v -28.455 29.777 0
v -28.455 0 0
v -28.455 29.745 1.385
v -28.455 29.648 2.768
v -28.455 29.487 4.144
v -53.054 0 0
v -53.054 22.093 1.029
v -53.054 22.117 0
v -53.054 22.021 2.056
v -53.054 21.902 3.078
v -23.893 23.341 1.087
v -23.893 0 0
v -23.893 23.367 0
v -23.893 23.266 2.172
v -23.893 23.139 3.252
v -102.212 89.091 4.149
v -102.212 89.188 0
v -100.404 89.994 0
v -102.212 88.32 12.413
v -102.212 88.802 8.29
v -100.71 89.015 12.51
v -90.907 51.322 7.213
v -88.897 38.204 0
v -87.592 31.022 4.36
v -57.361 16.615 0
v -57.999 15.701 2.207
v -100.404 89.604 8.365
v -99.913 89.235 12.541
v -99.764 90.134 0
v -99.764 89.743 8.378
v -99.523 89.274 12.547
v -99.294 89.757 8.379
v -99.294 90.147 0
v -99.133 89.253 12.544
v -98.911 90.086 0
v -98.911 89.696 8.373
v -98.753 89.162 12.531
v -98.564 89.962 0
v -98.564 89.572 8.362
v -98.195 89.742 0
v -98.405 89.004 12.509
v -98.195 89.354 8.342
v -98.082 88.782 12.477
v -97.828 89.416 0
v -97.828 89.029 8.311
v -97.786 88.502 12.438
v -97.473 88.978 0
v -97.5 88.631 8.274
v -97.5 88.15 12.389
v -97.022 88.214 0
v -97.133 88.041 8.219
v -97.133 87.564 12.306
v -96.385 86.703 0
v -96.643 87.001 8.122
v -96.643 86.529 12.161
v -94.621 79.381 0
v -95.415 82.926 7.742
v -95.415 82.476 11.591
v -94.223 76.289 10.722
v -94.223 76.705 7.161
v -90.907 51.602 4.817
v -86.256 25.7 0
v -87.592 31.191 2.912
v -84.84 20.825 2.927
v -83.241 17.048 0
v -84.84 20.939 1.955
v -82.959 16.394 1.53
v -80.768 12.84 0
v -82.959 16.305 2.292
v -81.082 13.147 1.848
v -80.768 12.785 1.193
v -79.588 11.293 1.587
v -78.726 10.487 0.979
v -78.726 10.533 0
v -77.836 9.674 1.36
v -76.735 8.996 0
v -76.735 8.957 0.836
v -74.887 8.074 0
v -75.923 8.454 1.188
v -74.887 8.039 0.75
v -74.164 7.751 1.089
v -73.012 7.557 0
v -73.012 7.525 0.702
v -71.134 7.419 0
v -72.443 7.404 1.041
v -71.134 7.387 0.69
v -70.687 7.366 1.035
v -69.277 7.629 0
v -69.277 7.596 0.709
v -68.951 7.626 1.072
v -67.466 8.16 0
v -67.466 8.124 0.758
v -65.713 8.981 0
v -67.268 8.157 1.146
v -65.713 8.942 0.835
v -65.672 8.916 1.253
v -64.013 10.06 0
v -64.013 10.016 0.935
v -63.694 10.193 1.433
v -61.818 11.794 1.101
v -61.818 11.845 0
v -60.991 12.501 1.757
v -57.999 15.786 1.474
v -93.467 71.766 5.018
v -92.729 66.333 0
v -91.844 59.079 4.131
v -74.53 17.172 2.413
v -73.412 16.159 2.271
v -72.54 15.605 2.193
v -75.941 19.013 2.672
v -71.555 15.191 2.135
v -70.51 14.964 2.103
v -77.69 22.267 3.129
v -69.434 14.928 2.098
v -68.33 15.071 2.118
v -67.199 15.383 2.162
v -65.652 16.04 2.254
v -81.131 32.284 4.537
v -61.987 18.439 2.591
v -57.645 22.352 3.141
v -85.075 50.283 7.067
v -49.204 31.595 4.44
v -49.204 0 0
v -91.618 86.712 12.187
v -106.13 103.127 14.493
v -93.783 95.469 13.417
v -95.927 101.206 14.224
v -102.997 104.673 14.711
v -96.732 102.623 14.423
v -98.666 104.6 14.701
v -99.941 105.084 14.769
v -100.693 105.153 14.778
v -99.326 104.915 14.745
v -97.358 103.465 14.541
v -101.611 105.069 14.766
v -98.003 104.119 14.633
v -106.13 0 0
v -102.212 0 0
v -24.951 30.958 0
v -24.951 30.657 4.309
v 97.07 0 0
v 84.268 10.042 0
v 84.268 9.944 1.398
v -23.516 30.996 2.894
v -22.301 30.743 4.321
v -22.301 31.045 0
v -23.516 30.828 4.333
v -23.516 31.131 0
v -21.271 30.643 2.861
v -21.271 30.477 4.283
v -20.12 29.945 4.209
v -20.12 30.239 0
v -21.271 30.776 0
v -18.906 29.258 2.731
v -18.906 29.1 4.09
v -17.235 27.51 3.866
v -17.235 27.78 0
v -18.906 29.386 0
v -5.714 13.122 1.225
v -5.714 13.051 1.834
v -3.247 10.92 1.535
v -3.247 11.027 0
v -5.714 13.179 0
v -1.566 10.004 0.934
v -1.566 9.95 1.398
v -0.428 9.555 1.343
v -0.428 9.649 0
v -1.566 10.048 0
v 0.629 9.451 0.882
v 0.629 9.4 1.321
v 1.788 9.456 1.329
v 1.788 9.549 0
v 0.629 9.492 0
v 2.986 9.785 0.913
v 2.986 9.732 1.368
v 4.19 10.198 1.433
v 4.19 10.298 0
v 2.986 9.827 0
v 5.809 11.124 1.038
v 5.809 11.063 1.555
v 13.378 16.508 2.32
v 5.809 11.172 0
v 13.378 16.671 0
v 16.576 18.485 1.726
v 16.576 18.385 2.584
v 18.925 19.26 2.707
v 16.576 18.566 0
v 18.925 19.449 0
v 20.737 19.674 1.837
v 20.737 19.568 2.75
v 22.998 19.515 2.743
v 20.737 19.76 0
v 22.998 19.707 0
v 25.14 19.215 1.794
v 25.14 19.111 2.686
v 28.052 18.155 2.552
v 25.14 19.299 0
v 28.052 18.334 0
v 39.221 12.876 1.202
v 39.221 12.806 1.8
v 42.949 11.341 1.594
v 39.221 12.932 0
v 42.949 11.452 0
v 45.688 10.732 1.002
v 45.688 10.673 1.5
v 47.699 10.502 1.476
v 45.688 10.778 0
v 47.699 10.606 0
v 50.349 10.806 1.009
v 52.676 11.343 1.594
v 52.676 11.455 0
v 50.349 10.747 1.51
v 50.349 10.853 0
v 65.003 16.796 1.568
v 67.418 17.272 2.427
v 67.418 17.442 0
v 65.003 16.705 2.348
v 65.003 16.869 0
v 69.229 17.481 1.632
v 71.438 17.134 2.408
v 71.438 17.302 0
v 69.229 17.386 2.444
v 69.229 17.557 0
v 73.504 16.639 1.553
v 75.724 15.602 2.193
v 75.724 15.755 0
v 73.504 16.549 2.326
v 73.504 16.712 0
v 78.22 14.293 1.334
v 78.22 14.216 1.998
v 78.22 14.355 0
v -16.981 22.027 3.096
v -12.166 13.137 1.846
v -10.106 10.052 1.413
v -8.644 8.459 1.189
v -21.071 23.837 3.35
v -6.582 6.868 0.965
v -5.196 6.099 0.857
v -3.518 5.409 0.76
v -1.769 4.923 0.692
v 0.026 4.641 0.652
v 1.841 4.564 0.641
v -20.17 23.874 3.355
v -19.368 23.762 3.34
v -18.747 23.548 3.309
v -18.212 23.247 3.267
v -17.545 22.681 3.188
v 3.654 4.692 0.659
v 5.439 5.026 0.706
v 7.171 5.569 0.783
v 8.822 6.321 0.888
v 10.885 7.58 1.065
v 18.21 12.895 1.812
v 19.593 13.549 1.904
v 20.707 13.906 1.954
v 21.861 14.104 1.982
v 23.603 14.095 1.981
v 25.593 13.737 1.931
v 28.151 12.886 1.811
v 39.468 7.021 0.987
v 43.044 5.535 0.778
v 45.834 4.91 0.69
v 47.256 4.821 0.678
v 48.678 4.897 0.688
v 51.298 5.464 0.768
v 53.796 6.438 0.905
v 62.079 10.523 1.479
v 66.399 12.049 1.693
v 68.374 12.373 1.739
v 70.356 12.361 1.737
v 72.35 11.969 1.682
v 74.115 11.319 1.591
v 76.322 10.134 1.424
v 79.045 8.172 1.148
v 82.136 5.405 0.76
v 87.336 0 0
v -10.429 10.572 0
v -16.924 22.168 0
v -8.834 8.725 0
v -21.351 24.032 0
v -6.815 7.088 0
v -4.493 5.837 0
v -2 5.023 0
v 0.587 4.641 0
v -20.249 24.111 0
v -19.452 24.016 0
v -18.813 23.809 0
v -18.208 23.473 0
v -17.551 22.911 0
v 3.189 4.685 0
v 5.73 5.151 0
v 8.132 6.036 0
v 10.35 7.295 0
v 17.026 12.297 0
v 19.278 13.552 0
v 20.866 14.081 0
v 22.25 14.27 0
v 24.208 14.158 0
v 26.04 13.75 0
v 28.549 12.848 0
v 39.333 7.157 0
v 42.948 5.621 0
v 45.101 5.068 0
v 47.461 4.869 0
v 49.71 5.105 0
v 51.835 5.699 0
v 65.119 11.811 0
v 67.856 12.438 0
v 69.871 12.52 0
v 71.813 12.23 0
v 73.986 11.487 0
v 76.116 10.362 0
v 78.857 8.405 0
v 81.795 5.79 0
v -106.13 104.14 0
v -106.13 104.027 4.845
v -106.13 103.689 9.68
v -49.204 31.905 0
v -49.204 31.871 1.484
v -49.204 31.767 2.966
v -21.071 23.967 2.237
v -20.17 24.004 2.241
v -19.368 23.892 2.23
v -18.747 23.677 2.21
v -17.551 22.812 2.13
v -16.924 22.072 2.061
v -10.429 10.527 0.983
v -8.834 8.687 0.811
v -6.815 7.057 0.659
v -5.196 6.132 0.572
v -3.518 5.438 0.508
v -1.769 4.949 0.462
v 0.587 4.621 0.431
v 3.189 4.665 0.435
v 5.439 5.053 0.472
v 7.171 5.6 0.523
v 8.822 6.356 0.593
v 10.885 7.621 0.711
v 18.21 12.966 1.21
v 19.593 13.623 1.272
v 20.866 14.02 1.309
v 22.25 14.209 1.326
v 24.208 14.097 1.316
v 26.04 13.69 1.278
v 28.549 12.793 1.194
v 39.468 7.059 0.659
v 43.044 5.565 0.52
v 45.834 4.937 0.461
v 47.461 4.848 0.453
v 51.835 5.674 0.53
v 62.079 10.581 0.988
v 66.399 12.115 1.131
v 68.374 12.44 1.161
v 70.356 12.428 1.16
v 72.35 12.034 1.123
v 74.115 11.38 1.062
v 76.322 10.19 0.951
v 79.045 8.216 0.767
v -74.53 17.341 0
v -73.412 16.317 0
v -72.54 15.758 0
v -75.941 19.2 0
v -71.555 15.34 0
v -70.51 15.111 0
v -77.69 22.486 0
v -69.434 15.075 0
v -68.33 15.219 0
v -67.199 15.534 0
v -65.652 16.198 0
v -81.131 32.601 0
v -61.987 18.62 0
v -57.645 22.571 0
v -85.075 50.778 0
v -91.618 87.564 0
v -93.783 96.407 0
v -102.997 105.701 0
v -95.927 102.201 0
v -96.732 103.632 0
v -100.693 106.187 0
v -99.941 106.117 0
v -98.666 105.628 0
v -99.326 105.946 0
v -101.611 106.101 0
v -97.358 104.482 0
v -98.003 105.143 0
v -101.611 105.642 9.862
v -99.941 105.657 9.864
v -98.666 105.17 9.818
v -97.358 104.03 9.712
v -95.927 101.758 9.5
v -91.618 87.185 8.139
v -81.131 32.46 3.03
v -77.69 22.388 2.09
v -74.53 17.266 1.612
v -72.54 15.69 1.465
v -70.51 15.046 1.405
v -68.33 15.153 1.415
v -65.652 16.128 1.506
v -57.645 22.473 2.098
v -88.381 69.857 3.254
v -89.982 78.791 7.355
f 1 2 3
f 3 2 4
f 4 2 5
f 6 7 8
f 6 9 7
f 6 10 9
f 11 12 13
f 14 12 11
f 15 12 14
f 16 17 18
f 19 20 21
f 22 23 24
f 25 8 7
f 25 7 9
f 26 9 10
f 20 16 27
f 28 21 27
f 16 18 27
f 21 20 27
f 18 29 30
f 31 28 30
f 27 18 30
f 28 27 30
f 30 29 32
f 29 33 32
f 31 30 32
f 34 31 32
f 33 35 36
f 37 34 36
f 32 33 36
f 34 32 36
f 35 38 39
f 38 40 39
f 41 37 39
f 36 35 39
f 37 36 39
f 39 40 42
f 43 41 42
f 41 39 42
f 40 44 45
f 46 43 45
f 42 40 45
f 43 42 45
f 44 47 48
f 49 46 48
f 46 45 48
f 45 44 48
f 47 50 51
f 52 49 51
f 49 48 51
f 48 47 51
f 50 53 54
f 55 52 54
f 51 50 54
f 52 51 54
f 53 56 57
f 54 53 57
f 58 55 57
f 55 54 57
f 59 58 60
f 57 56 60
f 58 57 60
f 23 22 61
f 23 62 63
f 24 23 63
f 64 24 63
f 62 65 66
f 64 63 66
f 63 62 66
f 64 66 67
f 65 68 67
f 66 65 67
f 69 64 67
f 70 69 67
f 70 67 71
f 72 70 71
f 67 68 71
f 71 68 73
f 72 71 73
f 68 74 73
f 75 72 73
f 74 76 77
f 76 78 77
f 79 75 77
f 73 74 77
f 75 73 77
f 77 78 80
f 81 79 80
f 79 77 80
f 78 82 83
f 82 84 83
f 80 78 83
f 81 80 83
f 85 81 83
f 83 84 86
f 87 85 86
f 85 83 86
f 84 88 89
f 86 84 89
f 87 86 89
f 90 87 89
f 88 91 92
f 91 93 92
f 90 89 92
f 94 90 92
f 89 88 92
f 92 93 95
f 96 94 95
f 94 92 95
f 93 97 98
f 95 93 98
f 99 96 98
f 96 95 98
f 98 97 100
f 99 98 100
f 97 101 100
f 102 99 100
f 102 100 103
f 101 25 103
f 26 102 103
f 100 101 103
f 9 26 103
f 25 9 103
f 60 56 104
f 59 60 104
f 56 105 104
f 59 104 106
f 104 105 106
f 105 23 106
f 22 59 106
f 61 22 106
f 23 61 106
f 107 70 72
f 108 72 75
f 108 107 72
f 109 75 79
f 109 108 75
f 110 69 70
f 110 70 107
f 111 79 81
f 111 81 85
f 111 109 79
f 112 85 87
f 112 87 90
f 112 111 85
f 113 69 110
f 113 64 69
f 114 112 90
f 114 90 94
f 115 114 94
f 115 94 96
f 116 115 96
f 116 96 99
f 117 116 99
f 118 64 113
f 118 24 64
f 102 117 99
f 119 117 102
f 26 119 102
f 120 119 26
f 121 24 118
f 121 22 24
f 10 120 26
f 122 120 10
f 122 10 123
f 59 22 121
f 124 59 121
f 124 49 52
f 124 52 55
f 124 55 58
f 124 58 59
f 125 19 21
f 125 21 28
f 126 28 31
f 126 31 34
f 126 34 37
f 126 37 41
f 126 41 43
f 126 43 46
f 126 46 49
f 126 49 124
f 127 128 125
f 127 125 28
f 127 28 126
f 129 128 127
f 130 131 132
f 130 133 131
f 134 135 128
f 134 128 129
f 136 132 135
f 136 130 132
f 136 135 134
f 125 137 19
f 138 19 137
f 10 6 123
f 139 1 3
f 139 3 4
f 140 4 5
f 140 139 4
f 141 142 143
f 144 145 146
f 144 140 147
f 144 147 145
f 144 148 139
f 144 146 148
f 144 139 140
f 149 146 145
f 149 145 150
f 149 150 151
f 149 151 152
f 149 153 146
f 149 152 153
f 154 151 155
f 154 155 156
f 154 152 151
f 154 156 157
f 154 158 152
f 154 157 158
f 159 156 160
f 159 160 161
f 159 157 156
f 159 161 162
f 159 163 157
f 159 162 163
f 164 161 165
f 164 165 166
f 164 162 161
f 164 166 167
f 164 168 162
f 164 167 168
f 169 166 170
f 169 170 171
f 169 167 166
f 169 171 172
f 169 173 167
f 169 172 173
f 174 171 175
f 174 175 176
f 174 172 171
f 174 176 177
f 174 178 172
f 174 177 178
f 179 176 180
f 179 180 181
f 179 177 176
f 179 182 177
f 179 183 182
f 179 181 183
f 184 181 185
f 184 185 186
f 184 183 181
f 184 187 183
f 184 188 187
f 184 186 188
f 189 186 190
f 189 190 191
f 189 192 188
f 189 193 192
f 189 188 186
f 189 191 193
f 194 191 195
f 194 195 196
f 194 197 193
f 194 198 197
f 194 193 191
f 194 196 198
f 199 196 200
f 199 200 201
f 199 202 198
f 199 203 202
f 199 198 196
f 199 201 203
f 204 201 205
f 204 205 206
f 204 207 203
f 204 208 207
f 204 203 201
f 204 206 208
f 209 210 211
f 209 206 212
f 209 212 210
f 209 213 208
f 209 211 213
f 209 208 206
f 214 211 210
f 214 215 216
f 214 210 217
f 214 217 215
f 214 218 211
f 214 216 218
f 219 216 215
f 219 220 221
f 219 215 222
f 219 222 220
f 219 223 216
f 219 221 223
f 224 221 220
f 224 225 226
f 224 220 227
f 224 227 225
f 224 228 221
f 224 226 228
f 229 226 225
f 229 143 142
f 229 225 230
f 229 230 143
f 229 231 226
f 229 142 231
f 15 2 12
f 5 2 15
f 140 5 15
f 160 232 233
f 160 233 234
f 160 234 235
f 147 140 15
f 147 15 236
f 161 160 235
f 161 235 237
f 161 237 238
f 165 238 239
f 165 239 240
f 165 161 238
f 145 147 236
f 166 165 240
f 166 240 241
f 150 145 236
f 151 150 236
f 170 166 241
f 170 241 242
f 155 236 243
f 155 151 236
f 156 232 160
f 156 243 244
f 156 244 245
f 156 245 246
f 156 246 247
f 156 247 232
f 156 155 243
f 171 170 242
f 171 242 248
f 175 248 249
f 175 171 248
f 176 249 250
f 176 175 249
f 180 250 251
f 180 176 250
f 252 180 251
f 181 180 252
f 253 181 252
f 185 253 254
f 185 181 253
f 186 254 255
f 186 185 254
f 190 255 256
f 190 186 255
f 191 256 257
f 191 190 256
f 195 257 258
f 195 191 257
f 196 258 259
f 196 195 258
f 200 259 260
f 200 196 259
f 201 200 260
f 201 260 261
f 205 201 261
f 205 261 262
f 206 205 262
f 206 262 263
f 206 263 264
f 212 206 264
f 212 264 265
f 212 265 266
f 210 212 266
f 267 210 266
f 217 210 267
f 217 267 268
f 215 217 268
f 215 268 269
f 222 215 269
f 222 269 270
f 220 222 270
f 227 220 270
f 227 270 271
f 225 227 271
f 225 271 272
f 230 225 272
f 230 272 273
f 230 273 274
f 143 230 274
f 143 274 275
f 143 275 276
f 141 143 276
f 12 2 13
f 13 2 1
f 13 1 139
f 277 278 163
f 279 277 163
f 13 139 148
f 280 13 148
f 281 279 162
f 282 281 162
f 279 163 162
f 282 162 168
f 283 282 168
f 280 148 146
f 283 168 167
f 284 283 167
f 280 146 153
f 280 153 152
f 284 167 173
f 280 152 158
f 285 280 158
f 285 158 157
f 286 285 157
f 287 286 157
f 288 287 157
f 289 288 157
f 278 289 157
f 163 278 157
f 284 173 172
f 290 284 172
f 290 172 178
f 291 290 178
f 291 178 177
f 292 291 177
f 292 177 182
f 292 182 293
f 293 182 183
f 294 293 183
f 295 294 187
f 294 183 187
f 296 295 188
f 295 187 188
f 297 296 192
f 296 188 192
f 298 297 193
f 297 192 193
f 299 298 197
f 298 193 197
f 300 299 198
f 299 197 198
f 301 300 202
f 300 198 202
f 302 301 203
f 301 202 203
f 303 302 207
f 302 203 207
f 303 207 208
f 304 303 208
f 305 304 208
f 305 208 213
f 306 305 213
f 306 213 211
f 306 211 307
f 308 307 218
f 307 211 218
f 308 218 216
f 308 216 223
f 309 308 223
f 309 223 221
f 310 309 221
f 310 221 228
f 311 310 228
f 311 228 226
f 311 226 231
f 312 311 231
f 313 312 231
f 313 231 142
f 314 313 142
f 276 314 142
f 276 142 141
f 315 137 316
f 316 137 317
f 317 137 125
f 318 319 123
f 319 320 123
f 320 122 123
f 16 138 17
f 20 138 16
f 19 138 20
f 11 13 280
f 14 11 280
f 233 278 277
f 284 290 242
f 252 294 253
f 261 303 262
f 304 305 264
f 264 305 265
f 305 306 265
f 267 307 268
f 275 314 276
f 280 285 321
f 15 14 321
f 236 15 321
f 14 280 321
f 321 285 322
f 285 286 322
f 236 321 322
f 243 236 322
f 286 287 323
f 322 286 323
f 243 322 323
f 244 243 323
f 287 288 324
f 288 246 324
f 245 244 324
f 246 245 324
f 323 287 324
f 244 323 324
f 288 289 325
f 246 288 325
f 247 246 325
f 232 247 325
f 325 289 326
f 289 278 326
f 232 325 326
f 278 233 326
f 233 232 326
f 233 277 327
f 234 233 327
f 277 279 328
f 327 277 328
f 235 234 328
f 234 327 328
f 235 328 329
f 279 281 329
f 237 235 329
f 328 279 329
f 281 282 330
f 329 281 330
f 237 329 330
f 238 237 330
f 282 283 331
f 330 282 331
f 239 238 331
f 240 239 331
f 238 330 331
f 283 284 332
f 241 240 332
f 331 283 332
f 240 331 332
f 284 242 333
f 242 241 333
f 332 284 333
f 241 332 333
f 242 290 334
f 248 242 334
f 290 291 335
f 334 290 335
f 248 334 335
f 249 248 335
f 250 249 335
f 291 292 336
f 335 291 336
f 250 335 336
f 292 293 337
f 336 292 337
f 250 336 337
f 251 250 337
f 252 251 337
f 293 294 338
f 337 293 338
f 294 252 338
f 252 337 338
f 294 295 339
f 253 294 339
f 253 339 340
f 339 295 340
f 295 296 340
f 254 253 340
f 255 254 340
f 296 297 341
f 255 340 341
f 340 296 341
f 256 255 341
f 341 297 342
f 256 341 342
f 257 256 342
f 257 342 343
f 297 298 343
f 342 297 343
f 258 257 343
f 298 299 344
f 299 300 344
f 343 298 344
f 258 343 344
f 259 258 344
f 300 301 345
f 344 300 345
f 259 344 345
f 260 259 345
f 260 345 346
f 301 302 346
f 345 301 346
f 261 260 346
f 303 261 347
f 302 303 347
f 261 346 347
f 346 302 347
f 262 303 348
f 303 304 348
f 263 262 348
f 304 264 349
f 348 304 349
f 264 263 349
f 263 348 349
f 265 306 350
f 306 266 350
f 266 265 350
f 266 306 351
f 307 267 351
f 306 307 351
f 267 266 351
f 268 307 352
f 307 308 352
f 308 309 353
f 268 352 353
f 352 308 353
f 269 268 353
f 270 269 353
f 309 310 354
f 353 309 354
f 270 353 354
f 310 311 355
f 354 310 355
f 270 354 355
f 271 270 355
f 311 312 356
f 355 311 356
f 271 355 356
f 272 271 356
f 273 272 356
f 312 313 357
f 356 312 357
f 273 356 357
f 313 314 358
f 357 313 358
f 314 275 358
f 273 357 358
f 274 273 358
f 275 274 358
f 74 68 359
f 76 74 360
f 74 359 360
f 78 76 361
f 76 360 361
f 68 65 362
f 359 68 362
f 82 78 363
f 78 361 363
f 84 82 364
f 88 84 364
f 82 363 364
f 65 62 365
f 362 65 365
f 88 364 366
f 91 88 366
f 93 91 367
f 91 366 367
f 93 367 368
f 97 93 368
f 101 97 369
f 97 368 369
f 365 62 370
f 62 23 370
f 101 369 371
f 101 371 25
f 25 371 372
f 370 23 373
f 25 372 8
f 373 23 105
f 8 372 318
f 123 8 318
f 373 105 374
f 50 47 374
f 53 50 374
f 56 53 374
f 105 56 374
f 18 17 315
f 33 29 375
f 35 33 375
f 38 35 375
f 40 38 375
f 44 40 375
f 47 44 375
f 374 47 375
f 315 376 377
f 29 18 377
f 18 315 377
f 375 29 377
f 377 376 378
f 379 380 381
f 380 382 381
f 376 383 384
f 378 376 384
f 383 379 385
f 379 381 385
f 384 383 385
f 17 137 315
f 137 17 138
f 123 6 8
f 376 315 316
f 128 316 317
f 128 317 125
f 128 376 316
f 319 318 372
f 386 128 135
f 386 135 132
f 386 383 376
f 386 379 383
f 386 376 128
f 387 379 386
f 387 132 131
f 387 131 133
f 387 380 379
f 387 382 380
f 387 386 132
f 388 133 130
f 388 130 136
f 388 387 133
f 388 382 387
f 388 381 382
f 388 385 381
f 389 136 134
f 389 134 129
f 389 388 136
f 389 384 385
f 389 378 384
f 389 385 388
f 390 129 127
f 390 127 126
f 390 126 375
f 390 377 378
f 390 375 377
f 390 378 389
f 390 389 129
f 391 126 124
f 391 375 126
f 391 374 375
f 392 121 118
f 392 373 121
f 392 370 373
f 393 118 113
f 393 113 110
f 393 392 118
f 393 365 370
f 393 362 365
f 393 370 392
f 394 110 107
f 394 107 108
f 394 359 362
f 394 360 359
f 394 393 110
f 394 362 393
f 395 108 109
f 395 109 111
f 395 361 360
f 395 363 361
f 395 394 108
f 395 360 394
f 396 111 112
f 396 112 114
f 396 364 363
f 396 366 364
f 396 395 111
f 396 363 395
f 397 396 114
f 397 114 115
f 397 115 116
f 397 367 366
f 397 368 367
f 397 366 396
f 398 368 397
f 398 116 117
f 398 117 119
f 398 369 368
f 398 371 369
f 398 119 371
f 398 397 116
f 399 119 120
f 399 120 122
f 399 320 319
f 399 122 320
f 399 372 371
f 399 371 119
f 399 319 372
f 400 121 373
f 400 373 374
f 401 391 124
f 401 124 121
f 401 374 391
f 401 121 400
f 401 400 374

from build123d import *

# Parameters (mm, degrees)
F1_ANGLE = 8


with BuildPart() as f1:
    # F0 (on Top) → F1 (revolve)
    with BuildSketch(Plane.XY):
        with BuildLine():
            Line((-106.130216633, 104.14), (-106.130216633, 0))
            Line((-106.130216633, 0), (-49.203816998, 0))
            Line((-49.203816998, 0), (-49.203816998, 31.9050640701))
            add(Edge.make_bspline(
                [(-106.130216633, 104.14), (-102.9643185402, 105.8969464572), (-89.6113543414, 113.3766914754), (-84.0305250862, -8.3679846124), (-58.3698734514, 21.3319865039), (-49.203816998, 31.9050640701)],
                knots=[0, 0, 0, 0, 0.1680697718, 0.6984969415, 1, 1, 1, 1], degree=3))
        make_face()
    revolve(axis=Axis((34.3074197894, 0, 0), (1, 0, 0)), revolution_arc=F1_ANGLE)


with BuildPart() as f1b:
    # F0 (on Top) → F1, piece 2 (revolve)
    with BuildSketch(Plane.XY):
        with BuildLine():
            Line((-28.4549437881, 29.7769746877), (-28.4549437881, 0))
            Line((-28.4549437881, 0), (97.069783367, 0))
            add(Edge.make_bspline(
                [(-28.4549437881, 29.7769746877), (-25.505510303, 30.9630226245), (-17.5911464043, 34.1460534526), (-0.8542154461, -2.6284593328), (19.6025747873, 29.7550463826), (47.1732142173, 2.3533173939), (69.848427966, 25.6421386534), (85.1405103407, 8.7121332704), (97.069783367, 0)],
                knots=[0, 0, 0, 0, 0.1040289186, 0.2871549349, 0.4507708752, 0.6357634036, 0.799392899, 1, 1, 1, 1], degree=3))
        make_face()
    revolve(axis=Axis((34.3074197894, 0, 0), (1, 0, 0)), revolution_arc=F1_ANGLE)


with BuildPart() as f3_tool:
    # F2 (on Top) → F3 (revolve)
    with BuildSketch(Plane.XY):
        with BuildLine():
            Line((-102.2120937705, 89.1878753901), (-102.2120937705, 0))
            Line((-102.2120937705, 0), (-53.0544854701, 0))
            Line((-53.0544854701, 0), (-53.0544854701, 22.1169088036))
            add(Edge.make_bspline(
                [(-102.2120937705, 89.1878753901), (-100.5856844661, 90.0233435374), (-92.466069192, 94.1942984824), (-91.4535396277, 12.6572494157), (-66.8636821011, 3.9773143697), (-57.7547195537, 15.9427379014), (-53.0544854701, 22.1169088036)],
                knots=[0, 0, 0, 0, 0.1098398271, 0.5483595892, 0.7669530815, 1, 1, 1, 1], degree=3))
        make_face()
        with BuildLine():
            Line((-23.8931979984, 23.3666785061), (-23.8931979984, 0))
            Line((-23.8931979984, 0), (87.336294353, 0))
            add(Edge.make_bspline(
                [(-23.8931979984, 23.3666785061), (-21.8257351009, 24.013255196), (-16.2055674211, 25.7709019325), (-11.5129910845, 5.315471635), (9.1942721336, 2.6573938778), (20.5862019508, 19.2373441103), (38.6773897038, 6.5239386869), (51.1949485047, 2.7386411572), (70.4171490805, 18.3730730749), (81.5971687408, 6.2323109448), (87.336294353, 0)],
                knots=[0, 0, 0, 0, 0.0763337222, 0.2075047242, 0.3375089586, 0.4642379535, 0.5995806215, 0.7120897566, 0.852204817, 1, 1, 1, 1], degree=3))
        make_face()
    revolve(axis=Axis((31.7215481773, 0, 0), (1, 0, 0)))


with BuildPart() as f1_1:
    add(f1.part)

    # F3: cut by f3_tool
    add(f3_tool.part, mode=Mode.SUBTRACT)


with BuildPart() as f1b_1:
    add(f1b.part)

    # F3: cut by f3_tool
    add(f3_tool.part, mode=Mode.SUBTRACT)


solid = Compound([f1_1.part, f1b_1.part])
